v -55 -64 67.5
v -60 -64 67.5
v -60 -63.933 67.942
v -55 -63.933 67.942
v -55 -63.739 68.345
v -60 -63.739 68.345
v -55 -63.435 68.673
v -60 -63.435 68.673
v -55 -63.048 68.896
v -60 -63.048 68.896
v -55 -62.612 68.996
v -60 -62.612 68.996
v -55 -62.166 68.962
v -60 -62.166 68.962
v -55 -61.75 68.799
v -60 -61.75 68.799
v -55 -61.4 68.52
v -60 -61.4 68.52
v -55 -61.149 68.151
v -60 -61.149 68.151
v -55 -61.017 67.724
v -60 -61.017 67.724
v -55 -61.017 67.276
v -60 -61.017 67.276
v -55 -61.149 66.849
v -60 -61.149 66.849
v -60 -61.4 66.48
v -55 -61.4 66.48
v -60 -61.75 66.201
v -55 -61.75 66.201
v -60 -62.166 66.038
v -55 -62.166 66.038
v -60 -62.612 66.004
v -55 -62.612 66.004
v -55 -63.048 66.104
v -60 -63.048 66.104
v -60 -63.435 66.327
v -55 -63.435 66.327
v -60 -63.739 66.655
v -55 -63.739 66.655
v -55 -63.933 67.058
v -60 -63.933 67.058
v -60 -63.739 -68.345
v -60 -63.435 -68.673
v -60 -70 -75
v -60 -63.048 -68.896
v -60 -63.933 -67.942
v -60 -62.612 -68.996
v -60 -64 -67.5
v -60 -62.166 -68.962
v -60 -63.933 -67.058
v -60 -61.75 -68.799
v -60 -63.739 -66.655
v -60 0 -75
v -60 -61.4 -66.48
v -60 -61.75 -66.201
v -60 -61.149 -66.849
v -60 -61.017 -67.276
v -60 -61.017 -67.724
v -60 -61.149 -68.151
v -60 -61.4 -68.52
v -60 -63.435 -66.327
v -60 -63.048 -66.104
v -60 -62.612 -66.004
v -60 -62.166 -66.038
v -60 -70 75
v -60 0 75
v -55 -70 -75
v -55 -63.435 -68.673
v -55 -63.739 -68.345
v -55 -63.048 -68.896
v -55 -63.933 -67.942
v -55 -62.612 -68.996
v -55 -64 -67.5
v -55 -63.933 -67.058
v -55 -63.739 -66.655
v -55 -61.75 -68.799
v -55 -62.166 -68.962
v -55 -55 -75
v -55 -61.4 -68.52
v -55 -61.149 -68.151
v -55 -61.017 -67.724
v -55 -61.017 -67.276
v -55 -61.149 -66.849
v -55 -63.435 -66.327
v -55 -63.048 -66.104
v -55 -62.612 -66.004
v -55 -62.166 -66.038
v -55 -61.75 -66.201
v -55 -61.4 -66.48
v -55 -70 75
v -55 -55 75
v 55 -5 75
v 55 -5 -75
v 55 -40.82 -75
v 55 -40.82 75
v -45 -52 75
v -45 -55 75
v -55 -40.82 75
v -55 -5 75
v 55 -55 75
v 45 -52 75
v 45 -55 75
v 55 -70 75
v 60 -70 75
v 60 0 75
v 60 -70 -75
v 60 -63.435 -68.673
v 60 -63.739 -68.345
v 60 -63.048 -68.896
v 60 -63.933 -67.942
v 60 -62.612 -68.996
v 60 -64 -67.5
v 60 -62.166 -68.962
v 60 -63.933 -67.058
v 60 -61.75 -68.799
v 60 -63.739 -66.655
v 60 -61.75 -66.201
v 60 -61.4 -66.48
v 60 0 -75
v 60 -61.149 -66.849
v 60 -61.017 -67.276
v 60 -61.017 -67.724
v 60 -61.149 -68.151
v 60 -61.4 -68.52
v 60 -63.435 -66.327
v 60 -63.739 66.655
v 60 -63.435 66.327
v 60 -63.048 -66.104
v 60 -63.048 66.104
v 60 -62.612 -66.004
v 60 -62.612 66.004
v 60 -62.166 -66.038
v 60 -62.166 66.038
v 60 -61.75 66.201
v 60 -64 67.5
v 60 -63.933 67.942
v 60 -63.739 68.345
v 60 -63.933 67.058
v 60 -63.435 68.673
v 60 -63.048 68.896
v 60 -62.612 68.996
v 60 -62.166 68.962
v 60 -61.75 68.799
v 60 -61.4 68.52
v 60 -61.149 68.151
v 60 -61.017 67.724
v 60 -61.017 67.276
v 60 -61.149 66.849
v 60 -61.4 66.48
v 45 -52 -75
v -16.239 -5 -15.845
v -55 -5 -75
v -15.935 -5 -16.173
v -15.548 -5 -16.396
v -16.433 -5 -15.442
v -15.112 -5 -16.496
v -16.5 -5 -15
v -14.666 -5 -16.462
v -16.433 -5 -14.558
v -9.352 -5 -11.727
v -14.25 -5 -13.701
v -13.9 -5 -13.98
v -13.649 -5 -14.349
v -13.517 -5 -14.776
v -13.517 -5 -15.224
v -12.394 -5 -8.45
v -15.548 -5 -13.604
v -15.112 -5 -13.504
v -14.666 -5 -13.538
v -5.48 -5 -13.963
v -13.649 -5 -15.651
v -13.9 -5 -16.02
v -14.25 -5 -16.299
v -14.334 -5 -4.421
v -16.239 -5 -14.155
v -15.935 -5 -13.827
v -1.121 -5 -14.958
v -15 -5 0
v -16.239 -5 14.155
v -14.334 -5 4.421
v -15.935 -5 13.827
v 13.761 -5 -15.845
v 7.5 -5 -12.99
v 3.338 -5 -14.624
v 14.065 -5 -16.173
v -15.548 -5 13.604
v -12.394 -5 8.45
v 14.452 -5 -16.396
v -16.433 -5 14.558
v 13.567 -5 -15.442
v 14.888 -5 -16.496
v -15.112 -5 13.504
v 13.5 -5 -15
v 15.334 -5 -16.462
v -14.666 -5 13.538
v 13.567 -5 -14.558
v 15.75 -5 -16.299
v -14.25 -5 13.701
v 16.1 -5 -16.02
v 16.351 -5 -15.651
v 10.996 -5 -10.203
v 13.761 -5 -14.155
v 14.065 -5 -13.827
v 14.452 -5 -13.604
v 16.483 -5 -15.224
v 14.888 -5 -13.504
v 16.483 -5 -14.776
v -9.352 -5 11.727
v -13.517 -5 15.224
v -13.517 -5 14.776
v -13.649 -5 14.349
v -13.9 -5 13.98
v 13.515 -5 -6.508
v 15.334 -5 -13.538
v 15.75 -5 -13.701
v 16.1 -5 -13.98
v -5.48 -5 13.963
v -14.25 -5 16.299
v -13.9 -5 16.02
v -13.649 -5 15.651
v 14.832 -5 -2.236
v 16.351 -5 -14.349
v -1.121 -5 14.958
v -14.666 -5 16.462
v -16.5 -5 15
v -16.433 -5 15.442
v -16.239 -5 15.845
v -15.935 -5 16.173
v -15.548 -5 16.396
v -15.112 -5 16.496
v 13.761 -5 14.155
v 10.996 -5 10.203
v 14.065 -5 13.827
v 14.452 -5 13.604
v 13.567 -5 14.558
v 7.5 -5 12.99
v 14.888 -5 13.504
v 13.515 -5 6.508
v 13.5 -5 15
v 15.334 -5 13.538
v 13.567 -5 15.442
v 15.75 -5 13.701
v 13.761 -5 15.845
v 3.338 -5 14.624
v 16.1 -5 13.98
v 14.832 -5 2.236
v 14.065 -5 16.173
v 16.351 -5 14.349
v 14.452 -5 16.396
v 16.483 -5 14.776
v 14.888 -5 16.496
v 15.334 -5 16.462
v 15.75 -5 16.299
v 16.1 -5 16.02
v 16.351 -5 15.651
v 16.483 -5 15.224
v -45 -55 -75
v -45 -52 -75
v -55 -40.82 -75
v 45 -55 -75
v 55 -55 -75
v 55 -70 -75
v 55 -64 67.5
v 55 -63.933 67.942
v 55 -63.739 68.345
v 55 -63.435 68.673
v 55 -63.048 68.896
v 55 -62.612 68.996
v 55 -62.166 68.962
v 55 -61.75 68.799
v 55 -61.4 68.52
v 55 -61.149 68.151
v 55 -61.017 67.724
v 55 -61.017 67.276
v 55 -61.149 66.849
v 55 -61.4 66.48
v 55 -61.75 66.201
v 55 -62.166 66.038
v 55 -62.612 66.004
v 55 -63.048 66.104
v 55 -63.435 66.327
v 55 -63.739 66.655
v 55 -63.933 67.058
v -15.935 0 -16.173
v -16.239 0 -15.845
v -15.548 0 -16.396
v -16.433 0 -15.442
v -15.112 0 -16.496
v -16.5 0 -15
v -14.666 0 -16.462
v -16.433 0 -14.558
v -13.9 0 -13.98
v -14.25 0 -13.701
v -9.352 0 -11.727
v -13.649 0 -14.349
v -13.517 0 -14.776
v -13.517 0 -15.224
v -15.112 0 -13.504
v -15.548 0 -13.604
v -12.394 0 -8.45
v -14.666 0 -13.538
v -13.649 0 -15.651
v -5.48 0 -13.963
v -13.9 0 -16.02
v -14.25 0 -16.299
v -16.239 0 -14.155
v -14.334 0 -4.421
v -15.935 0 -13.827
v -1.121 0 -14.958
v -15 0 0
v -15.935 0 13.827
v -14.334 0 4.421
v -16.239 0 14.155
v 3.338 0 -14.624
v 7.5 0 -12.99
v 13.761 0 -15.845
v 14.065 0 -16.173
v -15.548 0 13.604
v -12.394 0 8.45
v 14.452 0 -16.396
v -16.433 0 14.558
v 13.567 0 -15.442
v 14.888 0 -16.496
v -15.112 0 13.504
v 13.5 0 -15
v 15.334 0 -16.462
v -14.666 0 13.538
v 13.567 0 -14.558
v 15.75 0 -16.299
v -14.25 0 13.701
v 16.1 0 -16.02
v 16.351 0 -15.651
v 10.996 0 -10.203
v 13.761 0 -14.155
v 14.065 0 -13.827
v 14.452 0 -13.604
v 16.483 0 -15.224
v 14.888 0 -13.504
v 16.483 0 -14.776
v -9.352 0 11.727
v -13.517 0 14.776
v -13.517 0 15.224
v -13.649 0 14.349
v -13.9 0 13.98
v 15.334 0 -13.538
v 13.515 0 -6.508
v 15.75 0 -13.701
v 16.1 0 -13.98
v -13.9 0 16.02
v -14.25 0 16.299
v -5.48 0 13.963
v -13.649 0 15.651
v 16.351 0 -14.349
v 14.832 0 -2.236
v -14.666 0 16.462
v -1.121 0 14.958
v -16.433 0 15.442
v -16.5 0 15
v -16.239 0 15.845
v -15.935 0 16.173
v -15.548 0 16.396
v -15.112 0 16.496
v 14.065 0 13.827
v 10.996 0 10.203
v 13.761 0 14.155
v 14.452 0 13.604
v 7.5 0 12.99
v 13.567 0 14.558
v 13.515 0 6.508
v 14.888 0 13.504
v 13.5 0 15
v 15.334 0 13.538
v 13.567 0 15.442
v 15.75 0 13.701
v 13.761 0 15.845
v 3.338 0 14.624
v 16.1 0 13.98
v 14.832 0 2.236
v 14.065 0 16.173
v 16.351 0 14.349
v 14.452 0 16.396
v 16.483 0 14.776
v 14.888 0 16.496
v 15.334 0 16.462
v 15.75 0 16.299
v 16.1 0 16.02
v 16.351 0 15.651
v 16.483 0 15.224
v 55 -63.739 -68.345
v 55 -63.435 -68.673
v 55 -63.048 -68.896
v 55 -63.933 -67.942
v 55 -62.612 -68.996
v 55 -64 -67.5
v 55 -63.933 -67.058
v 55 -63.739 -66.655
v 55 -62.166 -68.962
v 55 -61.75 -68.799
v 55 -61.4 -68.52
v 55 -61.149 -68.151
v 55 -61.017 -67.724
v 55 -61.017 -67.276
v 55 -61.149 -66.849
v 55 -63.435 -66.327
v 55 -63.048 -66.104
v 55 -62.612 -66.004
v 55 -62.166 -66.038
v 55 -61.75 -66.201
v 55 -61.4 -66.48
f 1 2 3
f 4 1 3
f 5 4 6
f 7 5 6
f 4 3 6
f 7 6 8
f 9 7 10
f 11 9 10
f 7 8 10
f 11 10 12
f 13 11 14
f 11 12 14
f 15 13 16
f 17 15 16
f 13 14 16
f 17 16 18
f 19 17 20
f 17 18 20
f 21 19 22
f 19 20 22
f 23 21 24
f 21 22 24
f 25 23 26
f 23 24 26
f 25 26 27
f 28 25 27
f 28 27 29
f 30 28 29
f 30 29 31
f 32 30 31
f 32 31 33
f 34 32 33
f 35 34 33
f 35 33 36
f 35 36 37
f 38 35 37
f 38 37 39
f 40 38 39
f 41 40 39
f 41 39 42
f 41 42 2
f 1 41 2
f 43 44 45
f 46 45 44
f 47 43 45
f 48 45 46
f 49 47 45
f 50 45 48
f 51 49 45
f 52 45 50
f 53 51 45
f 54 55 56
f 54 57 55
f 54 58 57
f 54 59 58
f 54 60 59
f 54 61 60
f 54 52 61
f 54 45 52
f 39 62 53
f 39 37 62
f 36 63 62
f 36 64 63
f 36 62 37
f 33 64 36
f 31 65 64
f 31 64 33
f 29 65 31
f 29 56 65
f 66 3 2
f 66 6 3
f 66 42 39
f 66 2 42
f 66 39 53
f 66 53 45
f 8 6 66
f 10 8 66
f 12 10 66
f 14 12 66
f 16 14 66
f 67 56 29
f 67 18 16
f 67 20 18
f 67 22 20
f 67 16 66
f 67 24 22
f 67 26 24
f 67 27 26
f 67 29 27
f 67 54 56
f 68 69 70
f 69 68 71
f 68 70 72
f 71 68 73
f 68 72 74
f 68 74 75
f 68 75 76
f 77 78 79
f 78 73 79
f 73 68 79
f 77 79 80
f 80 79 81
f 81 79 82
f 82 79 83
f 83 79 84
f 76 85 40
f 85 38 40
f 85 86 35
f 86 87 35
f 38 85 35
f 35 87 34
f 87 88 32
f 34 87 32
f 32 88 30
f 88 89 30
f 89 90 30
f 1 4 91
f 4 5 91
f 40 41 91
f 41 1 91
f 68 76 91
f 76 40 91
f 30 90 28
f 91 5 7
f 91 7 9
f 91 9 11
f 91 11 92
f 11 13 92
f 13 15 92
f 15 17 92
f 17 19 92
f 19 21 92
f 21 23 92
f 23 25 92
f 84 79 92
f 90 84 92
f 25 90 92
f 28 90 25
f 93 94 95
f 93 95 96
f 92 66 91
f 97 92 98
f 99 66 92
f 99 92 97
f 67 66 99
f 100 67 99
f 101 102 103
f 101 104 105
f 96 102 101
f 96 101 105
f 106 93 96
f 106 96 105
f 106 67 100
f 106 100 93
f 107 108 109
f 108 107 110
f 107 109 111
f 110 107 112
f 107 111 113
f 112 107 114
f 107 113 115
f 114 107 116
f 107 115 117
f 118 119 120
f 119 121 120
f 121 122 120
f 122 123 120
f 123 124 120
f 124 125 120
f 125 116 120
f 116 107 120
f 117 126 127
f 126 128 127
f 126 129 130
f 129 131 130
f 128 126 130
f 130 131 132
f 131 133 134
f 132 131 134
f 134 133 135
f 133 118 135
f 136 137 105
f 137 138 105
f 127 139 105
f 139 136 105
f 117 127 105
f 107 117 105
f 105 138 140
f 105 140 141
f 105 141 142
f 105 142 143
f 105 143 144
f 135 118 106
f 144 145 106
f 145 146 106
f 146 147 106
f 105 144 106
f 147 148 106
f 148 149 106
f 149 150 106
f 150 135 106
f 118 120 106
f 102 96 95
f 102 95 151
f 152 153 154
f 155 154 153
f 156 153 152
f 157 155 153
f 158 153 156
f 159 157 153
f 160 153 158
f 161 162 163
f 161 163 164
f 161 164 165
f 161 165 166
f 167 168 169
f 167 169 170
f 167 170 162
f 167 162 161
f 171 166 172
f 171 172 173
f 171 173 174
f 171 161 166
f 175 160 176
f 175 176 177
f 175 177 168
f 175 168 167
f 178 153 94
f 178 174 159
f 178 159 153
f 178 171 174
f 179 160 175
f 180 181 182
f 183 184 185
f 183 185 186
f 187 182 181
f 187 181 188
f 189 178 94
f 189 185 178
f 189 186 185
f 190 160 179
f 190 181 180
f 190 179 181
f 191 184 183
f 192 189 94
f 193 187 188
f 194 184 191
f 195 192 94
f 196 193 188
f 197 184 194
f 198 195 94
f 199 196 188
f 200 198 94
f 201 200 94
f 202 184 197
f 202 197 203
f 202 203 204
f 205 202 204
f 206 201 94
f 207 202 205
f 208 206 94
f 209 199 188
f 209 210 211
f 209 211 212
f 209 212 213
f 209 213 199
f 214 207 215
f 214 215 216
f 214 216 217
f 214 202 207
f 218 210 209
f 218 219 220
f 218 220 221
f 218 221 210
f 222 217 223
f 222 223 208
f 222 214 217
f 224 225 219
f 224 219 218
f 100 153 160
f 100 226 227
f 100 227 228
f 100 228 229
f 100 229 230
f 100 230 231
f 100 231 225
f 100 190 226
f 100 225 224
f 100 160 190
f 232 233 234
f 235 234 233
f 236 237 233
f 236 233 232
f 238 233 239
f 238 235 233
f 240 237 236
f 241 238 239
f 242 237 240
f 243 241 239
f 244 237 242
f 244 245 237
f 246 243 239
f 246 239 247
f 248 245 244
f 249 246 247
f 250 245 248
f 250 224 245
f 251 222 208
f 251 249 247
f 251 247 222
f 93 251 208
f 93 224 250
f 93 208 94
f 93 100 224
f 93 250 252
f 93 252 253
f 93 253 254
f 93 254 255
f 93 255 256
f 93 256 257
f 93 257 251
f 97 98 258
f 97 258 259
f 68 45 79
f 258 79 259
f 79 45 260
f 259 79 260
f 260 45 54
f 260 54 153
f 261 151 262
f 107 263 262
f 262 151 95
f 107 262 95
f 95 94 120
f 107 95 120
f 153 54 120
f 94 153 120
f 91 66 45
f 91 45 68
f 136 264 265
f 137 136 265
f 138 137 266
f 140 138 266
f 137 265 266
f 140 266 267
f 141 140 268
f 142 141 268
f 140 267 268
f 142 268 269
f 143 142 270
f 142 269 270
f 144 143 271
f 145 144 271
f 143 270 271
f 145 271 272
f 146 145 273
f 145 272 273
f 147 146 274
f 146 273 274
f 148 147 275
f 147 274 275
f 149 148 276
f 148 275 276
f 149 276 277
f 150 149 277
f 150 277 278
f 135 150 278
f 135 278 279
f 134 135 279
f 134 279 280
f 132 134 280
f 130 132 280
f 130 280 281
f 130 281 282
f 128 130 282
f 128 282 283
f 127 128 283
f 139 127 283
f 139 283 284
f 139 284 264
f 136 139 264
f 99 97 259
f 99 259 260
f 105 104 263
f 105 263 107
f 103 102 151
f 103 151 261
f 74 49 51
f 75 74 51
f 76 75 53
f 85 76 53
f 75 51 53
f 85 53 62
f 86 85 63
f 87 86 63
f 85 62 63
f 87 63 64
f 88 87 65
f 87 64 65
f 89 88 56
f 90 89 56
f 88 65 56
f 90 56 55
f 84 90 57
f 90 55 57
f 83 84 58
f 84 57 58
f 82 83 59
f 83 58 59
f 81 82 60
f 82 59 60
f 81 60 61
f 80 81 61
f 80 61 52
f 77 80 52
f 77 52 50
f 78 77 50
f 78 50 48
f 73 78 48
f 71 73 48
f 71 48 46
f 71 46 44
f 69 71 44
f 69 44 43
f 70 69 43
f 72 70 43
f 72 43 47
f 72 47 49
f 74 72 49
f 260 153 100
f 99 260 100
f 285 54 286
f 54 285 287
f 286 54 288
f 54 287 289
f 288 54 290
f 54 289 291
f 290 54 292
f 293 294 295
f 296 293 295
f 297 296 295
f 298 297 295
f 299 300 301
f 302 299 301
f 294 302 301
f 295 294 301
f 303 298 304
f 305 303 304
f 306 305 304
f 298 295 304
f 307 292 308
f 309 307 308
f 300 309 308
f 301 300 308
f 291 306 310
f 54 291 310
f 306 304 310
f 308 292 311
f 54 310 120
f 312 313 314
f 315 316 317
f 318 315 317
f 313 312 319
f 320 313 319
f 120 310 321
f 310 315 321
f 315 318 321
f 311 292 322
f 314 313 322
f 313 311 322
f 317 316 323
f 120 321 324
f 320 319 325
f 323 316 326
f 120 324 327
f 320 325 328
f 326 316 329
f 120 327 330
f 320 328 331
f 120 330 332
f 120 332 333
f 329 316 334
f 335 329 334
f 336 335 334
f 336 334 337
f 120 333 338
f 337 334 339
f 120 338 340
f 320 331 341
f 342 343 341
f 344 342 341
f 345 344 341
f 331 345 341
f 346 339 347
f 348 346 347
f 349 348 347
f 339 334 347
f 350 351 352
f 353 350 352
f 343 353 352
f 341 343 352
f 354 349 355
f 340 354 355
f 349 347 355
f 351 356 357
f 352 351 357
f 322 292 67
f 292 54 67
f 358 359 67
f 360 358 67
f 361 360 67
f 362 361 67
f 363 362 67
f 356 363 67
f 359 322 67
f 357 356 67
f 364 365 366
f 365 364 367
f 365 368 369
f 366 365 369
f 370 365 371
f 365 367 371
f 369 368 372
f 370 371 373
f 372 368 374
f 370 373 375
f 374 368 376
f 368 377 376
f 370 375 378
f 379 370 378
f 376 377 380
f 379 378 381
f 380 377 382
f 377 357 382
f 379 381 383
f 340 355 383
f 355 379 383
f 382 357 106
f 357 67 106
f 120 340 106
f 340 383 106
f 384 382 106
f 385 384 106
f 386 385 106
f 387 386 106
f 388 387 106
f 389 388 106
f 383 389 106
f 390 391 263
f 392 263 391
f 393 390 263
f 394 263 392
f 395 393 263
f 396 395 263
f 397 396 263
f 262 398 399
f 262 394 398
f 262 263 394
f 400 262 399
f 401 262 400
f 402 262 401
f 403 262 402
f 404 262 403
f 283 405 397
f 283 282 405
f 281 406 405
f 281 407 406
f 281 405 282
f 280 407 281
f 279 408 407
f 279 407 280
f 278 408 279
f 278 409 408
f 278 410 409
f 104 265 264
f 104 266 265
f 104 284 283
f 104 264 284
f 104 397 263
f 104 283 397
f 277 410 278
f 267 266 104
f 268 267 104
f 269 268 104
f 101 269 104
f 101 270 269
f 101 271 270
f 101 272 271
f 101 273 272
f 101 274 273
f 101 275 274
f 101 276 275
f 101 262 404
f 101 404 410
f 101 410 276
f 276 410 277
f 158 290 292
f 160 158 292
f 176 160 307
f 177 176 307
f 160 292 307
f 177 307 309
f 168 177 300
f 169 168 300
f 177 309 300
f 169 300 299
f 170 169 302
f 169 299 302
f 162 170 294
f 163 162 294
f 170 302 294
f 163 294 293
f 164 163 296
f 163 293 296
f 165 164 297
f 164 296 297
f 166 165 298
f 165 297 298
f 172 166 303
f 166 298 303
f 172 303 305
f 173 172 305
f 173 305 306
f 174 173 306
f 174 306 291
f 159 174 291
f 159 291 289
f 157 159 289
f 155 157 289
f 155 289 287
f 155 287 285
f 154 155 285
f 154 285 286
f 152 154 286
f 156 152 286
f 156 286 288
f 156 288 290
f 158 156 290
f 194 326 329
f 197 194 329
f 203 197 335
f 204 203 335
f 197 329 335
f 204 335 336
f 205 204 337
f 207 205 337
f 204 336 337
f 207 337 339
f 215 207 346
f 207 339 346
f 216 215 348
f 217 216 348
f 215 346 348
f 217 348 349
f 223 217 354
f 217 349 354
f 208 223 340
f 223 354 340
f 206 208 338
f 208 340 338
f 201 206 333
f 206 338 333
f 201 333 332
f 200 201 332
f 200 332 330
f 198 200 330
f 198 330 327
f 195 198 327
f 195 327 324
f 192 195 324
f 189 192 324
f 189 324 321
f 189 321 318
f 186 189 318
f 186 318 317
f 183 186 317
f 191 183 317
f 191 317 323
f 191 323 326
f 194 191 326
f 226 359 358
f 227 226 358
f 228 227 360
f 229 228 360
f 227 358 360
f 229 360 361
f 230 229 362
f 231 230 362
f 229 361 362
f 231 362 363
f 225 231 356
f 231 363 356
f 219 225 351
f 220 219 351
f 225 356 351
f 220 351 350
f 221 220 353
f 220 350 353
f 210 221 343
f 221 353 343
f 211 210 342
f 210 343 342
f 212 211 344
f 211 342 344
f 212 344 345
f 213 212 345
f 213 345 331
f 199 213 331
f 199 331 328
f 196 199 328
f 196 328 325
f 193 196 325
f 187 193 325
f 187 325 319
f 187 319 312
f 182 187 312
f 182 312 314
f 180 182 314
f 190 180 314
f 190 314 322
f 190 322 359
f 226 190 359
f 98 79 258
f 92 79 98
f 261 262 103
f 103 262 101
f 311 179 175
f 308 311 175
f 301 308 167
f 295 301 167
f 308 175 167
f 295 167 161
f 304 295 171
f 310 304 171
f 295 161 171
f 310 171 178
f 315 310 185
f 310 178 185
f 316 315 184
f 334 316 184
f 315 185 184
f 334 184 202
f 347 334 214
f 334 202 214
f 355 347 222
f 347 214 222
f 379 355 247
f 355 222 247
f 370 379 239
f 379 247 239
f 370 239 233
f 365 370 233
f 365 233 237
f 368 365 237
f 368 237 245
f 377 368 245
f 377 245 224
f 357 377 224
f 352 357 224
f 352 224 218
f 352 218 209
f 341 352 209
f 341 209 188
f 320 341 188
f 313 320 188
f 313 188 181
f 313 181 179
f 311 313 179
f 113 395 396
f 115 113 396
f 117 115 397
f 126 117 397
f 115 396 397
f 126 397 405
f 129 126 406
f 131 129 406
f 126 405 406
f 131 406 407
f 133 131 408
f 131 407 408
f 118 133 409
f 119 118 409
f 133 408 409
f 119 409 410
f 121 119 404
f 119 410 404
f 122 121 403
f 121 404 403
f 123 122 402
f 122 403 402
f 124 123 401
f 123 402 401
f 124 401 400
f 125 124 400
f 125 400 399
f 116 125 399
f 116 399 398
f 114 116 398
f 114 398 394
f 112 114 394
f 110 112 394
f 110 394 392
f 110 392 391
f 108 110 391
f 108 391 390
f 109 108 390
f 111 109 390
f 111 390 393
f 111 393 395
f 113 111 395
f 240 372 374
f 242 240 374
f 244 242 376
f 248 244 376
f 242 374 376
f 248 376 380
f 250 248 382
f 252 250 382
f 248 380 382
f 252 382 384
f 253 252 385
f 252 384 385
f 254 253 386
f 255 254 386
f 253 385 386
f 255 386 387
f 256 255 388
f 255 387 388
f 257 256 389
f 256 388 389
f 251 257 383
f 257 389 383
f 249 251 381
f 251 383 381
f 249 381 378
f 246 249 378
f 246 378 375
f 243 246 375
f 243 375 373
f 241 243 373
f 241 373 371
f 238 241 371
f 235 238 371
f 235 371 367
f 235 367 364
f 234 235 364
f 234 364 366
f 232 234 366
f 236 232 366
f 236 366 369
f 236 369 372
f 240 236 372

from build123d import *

# Parameters (mm, degrees)
F0_W      = 120
F0_H      = 150
F1_DEPTH  = 5
F2_W      = 5
F2_H      = 150
F3_DEPTH  = 65
F4_W      = 3
F4_H      = 150
F5_DEPTH  = 10
F6_W      = 3
F6_H      = 150
F7_DEPTH  = 10
F9_DEPTH  = 150
F10_DEPTH = 150
F12_D     = 3
F13_D     = 30
F15_D     = 3


with BuildPart() as f1:
    # F0 (on Front) → F1 (new body)
    with BuildSketch(Plane.XZ):
        Rectangle(F0_W, F0_H)
    extrude(amount=F1_DEPTH)

    # F2 (on face) → F3 (join)
    with BuildSketch(Plane.XZ.offset(5)):
        with Locations((-57.5, 0)):
            Rectangle(F2_W, F2_H)
        with Locations((57.5, 0)):
            Rectangle(F2_W, F2_H)
    extrude(amount=F3_DEPTH)

    # F4 (on face) → F5 (join)
    with BuildSketch(Plane(origin=(55, 0, 0), x_dir=(0, -1, 0), z_dir=(-1, 0, 0))):
        with Locations((53.5, 0)):
            Rectangle(F4_W, F4_H)
    extrude(amount=F5_DEPTH)

    # F6 (on face) → F7 (join)
    with BuildSketch(Plane.YZ.offset(-55)):
        with Locations((-53.5, 0)):
            Rectangle(F6_W, F6_H)
    extrude(amount=F7_DEPTH)

    # F8 (on face) → F9 (join)
    with BuildSketch(Plane.XY.offset(75)):
        Polygon((55, -40.81966), (45, -52), (55, -52), align=None)
    extrude(amount=-F9_DEPTH)

    # F8 (on face) → F10 (join)
    with BuildSketch(Plane.XY.offset(75)):
        Polygon((55, -40.81966), (45, -52), (55, -52), align=None)
        Polygon((-55, -52), (-45, -52), (-55, -40.81966), align=None)
    extrude(amount=-F10_DEPTH)

    # F12 (through all)
    with Locations(Plane.XZ.offset(5)):
        with Locations((-15, 15), (0, 0), (-15, -15), (15, -15), (15, 15)):
            Hole(F12_D / 2)

    # F13 (through all)
    with Locations(Plane(origin=(0, 0, 0), x_dir=(1, 0, 0), z_dir=(0, 1, 0))):
        with Locations((0, 0)):
            Hole(F13_D / 2)

    # F15 (through all)
    with Locations(Plane.YZ.offset(60)):
        with Locations((-62.5, -67.5), (-62.5, 67.5)):
            Hole(F15_D / 2)


solid = f1.part
